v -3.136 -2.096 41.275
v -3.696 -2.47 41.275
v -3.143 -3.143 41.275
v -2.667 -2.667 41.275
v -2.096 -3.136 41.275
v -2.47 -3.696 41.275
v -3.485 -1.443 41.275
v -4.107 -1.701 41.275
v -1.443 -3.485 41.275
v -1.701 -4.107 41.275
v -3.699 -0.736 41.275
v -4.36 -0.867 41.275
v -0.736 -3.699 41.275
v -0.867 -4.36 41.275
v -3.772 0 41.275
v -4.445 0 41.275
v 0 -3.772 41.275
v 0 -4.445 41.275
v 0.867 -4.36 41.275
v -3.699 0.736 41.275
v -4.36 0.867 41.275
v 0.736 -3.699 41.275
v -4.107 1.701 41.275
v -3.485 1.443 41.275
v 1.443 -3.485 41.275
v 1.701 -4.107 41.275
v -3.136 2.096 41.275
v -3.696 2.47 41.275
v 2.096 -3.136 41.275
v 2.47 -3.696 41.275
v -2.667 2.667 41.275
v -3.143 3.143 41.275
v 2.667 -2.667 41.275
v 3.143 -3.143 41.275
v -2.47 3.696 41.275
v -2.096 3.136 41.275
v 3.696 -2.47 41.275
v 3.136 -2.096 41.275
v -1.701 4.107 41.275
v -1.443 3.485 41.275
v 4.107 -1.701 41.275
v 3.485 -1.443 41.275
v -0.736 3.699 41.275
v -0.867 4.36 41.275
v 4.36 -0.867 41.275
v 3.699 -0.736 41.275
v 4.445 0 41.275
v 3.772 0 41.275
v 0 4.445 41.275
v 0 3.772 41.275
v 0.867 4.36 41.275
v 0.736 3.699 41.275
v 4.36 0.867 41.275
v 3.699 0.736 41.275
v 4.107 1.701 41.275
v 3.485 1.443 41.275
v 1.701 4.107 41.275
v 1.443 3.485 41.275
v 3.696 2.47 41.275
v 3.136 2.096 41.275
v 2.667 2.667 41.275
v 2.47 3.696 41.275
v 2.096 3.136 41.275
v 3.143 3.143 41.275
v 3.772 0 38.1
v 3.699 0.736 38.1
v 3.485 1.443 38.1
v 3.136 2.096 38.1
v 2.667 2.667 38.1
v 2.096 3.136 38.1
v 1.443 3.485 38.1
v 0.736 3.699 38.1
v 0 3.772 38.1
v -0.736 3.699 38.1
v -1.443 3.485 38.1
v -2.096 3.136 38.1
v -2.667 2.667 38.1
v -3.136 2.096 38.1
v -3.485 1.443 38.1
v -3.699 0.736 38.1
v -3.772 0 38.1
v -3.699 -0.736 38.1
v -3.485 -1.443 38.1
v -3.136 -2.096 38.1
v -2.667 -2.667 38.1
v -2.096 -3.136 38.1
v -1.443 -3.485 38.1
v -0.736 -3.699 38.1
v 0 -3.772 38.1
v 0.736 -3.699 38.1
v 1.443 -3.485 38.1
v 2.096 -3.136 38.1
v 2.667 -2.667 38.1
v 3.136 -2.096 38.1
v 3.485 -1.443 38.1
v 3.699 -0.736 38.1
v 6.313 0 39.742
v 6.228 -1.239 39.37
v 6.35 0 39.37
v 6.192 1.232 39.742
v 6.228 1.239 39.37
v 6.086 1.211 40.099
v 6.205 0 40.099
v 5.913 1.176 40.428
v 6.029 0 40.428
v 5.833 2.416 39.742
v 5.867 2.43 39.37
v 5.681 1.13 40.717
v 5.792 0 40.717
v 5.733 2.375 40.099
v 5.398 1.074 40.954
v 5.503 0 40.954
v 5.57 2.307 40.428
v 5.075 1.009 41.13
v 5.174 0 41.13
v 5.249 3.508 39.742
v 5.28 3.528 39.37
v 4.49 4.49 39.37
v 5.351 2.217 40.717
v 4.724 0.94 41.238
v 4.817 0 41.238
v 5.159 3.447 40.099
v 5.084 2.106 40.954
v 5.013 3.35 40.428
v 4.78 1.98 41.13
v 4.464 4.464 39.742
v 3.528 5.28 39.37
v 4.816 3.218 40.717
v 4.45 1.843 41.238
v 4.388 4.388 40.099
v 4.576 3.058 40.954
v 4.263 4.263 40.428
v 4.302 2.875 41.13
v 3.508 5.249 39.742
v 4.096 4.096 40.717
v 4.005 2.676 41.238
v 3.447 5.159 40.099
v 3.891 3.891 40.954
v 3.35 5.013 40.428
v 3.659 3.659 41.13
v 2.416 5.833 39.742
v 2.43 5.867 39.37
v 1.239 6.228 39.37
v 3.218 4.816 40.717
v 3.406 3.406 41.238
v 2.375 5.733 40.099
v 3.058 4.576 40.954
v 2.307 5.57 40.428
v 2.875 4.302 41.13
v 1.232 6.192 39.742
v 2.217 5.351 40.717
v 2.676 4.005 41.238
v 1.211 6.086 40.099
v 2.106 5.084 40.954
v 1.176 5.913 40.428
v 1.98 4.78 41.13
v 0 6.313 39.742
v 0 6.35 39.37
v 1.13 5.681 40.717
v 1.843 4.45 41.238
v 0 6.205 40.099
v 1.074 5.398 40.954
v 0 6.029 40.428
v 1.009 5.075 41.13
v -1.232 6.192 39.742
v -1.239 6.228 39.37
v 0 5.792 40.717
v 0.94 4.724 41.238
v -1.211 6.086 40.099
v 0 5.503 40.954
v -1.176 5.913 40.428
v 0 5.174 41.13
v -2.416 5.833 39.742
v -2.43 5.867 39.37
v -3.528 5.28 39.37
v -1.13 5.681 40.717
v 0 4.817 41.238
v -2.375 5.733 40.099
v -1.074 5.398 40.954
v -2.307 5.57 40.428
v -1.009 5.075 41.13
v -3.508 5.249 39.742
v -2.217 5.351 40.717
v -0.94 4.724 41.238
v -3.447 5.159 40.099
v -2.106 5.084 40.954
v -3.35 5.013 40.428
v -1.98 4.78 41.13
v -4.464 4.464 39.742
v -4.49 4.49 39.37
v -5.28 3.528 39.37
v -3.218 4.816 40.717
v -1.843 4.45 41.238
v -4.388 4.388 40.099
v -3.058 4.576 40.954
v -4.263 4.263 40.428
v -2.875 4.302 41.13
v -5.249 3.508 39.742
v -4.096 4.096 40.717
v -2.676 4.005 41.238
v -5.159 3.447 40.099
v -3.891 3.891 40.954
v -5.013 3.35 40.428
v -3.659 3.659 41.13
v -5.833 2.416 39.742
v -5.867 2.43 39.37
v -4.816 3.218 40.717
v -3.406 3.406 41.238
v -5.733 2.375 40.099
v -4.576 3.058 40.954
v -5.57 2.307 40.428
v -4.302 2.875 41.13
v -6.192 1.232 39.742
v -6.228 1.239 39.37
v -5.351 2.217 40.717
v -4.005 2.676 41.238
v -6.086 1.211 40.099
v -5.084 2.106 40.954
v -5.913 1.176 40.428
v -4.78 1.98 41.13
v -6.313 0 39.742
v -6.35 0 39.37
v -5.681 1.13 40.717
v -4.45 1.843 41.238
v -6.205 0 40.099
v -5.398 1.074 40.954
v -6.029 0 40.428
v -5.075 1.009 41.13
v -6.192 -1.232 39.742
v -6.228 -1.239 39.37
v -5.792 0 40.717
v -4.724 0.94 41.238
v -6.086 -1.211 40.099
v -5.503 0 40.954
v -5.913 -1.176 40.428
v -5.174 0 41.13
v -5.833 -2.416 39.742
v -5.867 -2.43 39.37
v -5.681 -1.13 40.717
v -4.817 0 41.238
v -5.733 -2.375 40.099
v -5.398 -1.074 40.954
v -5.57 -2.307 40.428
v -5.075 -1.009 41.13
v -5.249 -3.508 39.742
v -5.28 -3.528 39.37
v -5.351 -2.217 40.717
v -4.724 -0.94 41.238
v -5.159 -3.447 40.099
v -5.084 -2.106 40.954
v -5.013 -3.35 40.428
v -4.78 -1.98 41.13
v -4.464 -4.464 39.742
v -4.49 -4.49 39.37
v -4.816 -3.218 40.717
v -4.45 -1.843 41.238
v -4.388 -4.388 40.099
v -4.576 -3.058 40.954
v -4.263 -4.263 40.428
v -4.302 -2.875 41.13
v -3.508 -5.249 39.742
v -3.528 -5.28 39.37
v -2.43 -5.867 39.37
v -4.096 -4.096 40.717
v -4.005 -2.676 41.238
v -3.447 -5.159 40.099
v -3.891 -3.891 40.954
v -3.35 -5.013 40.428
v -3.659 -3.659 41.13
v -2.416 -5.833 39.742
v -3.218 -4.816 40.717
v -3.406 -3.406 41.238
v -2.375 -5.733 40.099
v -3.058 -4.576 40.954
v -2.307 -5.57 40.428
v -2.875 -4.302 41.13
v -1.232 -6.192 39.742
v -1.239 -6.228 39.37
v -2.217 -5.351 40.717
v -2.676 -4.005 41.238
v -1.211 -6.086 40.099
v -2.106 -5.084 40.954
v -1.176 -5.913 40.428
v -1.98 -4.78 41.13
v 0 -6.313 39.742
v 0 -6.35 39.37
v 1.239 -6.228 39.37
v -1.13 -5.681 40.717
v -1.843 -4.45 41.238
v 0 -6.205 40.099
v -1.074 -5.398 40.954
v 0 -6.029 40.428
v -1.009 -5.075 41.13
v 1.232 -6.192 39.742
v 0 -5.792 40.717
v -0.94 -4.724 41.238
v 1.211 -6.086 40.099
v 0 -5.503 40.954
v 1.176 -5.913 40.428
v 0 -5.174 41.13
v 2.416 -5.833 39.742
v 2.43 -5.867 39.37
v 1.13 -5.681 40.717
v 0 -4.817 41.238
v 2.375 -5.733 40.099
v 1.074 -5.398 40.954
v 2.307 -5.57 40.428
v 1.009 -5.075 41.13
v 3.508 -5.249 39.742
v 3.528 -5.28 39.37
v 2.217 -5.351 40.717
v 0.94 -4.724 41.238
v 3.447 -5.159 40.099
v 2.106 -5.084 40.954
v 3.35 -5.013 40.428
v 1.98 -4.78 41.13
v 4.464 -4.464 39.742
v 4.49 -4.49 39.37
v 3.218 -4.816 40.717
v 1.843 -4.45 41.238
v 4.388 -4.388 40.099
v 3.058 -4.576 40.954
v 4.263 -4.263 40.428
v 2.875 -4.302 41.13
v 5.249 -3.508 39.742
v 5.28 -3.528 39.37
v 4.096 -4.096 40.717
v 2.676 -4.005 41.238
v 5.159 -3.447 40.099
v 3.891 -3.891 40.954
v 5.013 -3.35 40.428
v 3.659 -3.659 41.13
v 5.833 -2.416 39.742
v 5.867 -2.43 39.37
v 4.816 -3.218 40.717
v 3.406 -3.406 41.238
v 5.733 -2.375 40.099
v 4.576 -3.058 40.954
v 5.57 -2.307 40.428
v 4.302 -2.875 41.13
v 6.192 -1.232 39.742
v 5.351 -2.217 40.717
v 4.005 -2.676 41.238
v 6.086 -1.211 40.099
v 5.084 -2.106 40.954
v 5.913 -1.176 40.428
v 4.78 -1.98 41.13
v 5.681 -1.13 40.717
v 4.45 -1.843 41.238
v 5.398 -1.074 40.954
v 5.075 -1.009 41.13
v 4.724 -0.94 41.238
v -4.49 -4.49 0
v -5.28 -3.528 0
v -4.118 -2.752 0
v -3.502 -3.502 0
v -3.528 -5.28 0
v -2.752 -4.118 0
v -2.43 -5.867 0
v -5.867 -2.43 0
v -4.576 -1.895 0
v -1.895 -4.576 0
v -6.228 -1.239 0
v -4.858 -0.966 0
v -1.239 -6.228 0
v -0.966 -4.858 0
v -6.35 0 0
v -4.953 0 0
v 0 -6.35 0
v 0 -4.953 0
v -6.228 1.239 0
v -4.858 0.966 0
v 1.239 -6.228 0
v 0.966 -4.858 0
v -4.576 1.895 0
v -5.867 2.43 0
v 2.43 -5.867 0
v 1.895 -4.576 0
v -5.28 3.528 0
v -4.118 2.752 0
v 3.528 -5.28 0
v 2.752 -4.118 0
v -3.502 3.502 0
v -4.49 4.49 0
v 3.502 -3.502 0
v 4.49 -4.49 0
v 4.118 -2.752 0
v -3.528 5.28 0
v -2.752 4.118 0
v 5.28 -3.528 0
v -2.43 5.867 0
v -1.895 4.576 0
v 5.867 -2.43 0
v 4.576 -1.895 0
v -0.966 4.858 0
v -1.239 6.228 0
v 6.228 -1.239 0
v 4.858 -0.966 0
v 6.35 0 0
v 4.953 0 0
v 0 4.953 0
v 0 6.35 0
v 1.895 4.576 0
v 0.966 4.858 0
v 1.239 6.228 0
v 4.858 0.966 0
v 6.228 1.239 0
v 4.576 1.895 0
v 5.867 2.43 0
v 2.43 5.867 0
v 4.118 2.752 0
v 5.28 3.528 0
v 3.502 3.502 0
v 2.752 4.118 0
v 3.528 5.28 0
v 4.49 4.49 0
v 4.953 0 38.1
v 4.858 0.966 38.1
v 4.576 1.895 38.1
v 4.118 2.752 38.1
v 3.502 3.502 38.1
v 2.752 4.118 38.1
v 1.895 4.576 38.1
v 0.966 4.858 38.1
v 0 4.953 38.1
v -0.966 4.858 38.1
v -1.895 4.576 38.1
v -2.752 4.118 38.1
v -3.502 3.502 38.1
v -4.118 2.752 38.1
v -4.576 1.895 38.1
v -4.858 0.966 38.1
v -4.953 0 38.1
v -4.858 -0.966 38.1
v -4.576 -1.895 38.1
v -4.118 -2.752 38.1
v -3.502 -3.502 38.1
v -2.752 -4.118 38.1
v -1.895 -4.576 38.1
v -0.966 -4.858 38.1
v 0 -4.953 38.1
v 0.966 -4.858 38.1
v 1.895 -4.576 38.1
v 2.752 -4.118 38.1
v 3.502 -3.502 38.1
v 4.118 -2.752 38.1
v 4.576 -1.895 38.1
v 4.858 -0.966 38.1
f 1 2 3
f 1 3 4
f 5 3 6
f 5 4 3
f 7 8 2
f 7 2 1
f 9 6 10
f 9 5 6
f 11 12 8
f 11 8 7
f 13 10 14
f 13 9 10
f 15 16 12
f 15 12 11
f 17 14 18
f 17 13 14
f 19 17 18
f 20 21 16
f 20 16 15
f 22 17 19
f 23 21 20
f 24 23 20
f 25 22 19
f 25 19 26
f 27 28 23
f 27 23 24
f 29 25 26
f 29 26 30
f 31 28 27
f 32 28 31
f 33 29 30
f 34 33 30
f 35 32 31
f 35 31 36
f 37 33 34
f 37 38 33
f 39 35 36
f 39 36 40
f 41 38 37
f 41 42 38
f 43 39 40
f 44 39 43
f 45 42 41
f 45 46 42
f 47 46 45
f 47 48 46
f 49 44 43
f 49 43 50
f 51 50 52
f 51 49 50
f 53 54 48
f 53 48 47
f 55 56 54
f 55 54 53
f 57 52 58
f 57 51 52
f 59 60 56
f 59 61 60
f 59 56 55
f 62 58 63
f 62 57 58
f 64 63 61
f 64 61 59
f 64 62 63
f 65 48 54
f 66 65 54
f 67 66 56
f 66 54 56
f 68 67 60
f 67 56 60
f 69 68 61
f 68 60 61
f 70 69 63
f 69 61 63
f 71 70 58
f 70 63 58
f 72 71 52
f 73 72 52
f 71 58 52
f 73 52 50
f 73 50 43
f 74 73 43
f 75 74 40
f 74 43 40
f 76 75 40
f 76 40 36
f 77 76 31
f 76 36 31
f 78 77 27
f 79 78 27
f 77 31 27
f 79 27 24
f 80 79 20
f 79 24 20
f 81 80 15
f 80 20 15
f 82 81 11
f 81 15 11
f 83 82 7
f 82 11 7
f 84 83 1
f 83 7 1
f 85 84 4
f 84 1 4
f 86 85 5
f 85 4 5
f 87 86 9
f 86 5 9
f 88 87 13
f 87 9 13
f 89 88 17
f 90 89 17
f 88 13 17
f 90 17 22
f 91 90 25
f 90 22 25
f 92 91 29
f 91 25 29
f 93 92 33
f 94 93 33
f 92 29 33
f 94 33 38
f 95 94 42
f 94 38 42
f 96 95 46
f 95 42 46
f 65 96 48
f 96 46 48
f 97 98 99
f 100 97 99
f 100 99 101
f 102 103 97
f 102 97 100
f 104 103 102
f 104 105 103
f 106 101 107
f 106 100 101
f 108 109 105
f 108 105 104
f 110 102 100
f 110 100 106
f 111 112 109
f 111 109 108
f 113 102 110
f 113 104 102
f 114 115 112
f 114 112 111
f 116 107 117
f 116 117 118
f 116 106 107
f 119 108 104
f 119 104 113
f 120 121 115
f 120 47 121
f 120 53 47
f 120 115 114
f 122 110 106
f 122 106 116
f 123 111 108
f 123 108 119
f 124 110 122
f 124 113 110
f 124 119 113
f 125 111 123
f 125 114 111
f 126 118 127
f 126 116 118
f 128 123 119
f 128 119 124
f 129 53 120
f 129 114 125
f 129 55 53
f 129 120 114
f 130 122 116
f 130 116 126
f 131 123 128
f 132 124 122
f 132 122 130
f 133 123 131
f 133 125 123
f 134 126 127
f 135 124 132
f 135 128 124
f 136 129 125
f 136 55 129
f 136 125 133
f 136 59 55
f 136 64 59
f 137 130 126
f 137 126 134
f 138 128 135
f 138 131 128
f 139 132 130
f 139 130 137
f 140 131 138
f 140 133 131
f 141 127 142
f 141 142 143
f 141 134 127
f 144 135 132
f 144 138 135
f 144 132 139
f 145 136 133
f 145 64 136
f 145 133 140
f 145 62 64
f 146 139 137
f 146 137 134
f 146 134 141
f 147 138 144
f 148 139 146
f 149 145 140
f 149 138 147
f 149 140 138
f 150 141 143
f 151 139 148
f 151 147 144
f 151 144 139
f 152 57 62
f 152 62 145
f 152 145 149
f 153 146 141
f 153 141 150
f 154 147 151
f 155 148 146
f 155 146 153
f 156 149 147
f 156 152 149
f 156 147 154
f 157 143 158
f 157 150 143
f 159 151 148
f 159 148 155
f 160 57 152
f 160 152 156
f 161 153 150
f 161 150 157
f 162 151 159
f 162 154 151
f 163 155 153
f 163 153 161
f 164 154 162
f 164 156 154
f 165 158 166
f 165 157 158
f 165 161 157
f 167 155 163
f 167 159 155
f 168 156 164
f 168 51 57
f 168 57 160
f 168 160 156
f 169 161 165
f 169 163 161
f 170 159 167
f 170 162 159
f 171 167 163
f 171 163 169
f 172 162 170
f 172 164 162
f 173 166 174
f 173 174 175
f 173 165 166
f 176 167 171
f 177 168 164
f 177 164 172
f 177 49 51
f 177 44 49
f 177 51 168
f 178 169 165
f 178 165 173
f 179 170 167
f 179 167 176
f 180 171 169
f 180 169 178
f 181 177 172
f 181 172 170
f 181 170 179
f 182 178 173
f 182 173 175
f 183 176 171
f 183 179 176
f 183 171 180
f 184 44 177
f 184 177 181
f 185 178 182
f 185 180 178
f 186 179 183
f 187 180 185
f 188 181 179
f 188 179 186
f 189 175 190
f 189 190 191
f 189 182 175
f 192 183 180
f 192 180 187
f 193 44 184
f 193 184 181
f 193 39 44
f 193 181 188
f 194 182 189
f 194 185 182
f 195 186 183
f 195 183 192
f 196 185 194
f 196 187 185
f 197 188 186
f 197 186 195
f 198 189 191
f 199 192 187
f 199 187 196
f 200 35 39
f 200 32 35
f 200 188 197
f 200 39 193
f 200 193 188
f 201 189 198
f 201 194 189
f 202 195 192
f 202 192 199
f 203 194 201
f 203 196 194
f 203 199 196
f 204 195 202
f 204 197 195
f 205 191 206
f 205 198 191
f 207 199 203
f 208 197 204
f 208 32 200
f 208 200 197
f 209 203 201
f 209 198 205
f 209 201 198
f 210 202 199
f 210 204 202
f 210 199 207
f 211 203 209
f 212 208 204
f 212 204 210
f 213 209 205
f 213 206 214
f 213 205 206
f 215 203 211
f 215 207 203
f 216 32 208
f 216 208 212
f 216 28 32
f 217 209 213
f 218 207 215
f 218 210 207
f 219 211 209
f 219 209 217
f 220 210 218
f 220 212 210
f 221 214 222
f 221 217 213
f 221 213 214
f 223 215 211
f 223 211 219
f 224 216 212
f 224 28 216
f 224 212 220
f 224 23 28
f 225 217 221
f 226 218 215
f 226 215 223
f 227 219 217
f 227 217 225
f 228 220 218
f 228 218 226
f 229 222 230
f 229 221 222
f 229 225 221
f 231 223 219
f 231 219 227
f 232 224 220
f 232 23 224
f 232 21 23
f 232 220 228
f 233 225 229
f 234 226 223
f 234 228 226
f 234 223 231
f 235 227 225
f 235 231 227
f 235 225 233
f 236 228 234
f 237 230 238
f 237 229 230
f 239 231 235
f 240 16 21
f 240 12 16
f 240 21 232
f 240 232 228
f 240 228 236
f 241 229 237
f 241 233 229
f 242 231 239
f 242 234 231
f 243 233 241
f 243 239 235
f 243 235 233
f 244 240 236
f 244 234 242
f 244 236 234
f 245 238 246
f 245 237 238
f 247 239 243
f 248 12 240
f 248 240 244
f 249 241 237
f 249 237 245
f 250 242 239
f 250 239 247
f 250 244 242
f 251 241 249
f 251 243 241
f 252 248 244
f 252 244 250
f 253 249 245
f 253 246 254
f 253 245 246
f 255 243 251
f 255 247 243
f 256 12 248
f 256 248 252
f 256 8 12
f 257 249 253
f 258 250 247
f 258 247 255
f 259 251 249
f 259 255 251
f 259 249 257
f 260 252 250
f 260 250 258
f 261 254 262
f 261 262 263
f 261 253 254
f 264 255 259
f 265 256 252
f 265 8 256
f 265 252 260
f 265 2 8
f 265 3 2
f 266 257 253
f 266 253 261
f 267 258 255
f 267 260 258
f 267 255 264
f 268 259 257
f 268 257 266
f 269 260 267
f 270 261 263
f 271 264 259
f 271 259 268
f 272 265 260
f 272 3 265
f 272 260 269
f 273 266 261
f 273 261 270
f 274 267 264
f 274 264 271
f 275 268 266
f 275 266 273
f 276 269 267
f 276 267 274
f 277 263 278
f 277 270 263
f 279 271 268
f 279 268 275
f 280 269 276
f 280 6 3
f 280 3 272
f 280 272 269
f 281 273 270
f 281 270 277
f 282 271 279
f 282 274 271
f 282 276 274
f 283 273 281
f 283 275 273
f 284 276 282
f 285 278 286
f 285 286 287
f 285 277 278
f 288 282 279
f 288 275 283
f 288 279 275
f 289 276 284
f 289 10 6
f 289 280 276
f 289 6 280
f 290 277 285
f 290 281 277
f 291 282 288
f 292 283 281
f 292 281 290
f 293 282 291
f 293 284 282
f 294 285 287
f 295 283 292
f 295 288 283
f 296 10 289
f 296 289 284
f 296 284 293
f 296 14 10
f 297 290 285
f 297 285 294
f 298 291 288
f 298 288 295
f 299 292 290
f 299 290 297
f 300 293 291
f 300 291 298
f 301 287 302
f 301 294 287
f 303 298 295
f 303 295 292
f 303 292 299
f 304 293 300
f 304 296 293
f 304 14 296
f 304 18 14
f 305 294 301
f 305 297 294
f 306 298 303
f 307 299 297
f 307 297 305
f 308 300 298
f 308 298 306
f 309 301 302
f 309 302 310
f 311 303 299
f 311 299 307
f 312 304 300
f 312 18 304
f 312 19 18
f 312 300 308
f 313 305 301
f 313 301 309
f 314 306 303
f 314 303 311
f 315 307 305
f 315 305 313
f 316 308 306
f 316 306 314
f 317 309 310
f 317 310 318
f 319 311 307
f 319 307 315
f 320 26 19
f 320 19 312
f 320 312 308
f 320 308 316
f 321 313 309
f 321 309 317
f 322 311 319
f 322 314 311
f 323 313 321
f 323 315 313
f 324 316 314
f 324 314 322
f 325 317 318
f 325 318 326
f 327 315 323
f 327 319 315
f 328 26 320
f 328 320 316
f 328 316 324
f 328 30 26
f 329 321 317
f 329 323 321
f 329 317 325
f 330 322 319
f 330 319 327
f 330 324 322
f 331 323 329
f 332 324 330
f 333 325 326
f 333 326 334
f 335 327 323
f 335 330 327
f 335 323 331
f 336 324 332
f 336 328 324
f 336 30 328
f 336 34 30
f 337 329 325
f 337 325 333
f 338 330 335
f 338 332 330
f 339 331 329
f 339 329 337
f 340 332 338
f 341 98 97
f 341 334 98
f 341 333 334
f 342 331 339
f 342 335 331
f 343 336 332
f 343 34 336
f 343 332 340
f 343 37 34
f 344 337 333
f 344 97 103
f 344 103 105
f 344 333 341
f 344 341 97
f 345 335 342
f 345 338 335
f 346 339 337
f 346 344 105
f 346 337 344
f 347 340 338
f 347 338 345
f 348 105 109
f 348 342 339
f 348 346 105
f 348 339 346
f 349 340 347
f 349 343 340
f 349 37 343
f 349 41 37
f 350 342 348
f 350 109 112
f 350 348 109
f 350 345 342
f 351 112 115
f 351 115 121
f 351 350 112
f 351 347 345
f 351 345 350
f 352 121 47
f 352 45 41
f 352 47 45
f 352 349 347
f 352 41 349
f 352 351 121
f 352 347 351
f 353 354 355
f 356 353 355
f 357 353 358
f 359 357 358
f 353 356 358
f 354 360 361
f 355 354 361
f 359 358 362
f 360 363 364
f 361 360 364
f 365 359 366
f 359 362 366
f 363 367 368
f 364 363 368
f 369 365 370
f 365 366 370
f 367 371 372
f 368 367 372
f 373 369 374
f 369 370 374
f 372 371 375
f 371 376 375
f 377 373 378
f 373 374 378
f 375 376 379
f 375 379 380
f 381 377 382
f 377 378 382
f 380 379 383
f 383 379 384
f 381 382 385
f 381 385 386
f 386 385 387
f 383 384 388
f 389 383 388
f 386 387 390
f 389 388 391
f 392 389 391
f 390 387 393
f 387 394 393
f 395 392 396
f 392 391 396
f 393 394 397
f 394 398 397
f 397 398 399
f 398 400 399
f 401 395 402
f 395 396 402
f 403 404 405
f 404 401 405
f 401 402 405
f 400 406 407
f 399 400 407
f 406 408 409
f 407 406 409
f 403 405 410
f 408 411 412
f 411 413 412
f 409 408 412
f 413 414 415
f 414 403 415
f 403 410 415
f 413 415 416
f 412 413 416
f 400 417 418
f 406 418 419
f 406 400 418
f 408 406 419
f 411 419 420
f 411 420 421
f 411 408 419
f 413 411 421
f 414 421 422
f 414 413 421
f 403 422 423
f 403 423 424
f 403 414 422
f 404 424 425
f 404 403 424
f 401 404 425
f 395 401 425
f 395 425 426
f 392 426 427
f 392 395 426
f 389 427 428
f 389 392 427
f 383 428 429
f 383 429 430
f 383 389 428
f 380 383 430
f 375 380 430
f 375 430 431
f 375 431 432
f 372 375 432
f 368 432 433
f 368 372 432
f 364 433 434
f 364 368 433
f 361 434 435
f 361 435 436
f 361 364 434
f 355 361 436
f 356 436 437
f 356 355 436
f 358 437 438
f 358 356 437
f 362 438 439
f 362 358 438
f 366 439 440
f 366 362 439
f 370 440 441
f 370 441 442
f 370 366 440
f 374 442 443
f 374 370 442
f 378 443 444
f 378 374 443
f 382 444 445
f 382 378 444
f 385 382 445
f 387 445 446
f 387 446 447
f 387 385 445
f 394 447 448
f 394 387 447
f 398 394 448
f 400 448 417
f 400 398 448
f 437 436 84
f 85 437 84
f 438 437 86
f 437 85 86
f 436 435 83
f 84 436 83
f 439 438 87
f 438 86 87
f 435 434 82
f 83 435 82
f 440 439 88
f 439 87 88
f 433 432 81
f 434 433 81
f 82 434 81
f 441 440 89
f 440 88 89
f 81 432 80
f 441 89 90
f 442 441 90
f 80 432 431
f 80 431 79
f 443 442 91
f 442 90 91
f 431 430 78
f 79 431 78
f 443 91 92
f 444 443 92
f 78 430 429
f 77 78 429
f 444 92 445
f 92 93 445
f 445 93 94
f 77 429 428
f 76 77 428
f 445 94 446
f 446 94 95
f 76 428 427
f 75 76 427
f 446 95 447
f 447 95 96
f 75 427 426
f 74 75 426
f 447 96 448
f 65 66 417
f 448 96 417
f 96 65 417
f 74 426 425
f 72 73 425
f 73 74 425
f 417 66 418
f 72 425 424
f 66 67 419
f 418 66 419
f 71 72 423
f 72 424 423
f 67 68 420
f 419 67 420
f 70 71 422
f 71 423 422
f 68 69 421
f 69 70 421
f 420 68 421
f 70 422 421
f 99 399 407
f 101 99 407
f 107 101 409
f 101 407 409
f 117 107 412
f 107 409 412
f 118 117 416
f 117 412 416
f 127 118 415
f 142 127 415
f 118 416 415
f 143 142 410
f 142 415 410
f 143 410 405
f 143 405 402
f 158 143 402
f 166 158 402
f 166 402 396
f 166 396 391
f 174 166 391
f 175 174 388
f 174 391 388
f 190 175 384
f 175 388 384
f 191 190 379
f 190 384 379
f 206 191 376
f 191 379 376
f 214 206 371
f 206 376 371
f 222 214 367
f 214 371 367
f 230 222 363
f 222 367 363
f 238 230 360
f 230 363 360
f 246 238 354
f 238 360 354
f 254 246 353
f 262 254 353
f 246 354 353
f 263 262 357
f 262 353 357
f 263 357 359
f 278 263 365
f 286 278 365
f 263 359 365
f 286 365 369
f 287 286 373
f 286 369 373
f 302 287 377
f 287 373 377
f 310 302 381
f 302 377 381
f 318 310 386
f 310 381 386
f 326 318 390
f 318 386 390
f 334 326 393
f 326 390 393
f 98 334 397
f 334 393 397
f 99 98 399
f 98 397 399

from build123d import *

# Parameters (mm, degrees)
F0_R     = 6.35
F1_DEPTH = 41.275
F2_R     = 4.953
F3_DEPTH = 38.1
F5_R     = 3.7719
F6_DEPTH = 3.175
F7_R     = 1.905


with BuildPart() as f1:
    # F0 (on Top) → F1 (new body)
    with BuildSketch(Plane.XY):
        Circle(F0_R)
    extrude(amount=F1_DEPTH)

    # F2 (on Top) → F3 (cut)
    with BuildSketch(Plane.XY):
        Circle(F2_R)
    extrude(amount=F3_DEPTH, mode=Mode.SUBTRACT)

    # F5 (on offset) → F6 (cut, through all)
    with BuildSketch(Plane.XY.offset(41.275)):
        Circle(F5_R)
    extrude(amount=-F6_DEPTH, mode=Mode.SUBTRACT)

    # F7
    f7_edges = [f1.edges().sort_by_distance(p)[0] for p in [
        (-6.35, 0, 41.275),
    ]]
    fillet(f7_edges, radius=F7_R)


solid = f1.part
